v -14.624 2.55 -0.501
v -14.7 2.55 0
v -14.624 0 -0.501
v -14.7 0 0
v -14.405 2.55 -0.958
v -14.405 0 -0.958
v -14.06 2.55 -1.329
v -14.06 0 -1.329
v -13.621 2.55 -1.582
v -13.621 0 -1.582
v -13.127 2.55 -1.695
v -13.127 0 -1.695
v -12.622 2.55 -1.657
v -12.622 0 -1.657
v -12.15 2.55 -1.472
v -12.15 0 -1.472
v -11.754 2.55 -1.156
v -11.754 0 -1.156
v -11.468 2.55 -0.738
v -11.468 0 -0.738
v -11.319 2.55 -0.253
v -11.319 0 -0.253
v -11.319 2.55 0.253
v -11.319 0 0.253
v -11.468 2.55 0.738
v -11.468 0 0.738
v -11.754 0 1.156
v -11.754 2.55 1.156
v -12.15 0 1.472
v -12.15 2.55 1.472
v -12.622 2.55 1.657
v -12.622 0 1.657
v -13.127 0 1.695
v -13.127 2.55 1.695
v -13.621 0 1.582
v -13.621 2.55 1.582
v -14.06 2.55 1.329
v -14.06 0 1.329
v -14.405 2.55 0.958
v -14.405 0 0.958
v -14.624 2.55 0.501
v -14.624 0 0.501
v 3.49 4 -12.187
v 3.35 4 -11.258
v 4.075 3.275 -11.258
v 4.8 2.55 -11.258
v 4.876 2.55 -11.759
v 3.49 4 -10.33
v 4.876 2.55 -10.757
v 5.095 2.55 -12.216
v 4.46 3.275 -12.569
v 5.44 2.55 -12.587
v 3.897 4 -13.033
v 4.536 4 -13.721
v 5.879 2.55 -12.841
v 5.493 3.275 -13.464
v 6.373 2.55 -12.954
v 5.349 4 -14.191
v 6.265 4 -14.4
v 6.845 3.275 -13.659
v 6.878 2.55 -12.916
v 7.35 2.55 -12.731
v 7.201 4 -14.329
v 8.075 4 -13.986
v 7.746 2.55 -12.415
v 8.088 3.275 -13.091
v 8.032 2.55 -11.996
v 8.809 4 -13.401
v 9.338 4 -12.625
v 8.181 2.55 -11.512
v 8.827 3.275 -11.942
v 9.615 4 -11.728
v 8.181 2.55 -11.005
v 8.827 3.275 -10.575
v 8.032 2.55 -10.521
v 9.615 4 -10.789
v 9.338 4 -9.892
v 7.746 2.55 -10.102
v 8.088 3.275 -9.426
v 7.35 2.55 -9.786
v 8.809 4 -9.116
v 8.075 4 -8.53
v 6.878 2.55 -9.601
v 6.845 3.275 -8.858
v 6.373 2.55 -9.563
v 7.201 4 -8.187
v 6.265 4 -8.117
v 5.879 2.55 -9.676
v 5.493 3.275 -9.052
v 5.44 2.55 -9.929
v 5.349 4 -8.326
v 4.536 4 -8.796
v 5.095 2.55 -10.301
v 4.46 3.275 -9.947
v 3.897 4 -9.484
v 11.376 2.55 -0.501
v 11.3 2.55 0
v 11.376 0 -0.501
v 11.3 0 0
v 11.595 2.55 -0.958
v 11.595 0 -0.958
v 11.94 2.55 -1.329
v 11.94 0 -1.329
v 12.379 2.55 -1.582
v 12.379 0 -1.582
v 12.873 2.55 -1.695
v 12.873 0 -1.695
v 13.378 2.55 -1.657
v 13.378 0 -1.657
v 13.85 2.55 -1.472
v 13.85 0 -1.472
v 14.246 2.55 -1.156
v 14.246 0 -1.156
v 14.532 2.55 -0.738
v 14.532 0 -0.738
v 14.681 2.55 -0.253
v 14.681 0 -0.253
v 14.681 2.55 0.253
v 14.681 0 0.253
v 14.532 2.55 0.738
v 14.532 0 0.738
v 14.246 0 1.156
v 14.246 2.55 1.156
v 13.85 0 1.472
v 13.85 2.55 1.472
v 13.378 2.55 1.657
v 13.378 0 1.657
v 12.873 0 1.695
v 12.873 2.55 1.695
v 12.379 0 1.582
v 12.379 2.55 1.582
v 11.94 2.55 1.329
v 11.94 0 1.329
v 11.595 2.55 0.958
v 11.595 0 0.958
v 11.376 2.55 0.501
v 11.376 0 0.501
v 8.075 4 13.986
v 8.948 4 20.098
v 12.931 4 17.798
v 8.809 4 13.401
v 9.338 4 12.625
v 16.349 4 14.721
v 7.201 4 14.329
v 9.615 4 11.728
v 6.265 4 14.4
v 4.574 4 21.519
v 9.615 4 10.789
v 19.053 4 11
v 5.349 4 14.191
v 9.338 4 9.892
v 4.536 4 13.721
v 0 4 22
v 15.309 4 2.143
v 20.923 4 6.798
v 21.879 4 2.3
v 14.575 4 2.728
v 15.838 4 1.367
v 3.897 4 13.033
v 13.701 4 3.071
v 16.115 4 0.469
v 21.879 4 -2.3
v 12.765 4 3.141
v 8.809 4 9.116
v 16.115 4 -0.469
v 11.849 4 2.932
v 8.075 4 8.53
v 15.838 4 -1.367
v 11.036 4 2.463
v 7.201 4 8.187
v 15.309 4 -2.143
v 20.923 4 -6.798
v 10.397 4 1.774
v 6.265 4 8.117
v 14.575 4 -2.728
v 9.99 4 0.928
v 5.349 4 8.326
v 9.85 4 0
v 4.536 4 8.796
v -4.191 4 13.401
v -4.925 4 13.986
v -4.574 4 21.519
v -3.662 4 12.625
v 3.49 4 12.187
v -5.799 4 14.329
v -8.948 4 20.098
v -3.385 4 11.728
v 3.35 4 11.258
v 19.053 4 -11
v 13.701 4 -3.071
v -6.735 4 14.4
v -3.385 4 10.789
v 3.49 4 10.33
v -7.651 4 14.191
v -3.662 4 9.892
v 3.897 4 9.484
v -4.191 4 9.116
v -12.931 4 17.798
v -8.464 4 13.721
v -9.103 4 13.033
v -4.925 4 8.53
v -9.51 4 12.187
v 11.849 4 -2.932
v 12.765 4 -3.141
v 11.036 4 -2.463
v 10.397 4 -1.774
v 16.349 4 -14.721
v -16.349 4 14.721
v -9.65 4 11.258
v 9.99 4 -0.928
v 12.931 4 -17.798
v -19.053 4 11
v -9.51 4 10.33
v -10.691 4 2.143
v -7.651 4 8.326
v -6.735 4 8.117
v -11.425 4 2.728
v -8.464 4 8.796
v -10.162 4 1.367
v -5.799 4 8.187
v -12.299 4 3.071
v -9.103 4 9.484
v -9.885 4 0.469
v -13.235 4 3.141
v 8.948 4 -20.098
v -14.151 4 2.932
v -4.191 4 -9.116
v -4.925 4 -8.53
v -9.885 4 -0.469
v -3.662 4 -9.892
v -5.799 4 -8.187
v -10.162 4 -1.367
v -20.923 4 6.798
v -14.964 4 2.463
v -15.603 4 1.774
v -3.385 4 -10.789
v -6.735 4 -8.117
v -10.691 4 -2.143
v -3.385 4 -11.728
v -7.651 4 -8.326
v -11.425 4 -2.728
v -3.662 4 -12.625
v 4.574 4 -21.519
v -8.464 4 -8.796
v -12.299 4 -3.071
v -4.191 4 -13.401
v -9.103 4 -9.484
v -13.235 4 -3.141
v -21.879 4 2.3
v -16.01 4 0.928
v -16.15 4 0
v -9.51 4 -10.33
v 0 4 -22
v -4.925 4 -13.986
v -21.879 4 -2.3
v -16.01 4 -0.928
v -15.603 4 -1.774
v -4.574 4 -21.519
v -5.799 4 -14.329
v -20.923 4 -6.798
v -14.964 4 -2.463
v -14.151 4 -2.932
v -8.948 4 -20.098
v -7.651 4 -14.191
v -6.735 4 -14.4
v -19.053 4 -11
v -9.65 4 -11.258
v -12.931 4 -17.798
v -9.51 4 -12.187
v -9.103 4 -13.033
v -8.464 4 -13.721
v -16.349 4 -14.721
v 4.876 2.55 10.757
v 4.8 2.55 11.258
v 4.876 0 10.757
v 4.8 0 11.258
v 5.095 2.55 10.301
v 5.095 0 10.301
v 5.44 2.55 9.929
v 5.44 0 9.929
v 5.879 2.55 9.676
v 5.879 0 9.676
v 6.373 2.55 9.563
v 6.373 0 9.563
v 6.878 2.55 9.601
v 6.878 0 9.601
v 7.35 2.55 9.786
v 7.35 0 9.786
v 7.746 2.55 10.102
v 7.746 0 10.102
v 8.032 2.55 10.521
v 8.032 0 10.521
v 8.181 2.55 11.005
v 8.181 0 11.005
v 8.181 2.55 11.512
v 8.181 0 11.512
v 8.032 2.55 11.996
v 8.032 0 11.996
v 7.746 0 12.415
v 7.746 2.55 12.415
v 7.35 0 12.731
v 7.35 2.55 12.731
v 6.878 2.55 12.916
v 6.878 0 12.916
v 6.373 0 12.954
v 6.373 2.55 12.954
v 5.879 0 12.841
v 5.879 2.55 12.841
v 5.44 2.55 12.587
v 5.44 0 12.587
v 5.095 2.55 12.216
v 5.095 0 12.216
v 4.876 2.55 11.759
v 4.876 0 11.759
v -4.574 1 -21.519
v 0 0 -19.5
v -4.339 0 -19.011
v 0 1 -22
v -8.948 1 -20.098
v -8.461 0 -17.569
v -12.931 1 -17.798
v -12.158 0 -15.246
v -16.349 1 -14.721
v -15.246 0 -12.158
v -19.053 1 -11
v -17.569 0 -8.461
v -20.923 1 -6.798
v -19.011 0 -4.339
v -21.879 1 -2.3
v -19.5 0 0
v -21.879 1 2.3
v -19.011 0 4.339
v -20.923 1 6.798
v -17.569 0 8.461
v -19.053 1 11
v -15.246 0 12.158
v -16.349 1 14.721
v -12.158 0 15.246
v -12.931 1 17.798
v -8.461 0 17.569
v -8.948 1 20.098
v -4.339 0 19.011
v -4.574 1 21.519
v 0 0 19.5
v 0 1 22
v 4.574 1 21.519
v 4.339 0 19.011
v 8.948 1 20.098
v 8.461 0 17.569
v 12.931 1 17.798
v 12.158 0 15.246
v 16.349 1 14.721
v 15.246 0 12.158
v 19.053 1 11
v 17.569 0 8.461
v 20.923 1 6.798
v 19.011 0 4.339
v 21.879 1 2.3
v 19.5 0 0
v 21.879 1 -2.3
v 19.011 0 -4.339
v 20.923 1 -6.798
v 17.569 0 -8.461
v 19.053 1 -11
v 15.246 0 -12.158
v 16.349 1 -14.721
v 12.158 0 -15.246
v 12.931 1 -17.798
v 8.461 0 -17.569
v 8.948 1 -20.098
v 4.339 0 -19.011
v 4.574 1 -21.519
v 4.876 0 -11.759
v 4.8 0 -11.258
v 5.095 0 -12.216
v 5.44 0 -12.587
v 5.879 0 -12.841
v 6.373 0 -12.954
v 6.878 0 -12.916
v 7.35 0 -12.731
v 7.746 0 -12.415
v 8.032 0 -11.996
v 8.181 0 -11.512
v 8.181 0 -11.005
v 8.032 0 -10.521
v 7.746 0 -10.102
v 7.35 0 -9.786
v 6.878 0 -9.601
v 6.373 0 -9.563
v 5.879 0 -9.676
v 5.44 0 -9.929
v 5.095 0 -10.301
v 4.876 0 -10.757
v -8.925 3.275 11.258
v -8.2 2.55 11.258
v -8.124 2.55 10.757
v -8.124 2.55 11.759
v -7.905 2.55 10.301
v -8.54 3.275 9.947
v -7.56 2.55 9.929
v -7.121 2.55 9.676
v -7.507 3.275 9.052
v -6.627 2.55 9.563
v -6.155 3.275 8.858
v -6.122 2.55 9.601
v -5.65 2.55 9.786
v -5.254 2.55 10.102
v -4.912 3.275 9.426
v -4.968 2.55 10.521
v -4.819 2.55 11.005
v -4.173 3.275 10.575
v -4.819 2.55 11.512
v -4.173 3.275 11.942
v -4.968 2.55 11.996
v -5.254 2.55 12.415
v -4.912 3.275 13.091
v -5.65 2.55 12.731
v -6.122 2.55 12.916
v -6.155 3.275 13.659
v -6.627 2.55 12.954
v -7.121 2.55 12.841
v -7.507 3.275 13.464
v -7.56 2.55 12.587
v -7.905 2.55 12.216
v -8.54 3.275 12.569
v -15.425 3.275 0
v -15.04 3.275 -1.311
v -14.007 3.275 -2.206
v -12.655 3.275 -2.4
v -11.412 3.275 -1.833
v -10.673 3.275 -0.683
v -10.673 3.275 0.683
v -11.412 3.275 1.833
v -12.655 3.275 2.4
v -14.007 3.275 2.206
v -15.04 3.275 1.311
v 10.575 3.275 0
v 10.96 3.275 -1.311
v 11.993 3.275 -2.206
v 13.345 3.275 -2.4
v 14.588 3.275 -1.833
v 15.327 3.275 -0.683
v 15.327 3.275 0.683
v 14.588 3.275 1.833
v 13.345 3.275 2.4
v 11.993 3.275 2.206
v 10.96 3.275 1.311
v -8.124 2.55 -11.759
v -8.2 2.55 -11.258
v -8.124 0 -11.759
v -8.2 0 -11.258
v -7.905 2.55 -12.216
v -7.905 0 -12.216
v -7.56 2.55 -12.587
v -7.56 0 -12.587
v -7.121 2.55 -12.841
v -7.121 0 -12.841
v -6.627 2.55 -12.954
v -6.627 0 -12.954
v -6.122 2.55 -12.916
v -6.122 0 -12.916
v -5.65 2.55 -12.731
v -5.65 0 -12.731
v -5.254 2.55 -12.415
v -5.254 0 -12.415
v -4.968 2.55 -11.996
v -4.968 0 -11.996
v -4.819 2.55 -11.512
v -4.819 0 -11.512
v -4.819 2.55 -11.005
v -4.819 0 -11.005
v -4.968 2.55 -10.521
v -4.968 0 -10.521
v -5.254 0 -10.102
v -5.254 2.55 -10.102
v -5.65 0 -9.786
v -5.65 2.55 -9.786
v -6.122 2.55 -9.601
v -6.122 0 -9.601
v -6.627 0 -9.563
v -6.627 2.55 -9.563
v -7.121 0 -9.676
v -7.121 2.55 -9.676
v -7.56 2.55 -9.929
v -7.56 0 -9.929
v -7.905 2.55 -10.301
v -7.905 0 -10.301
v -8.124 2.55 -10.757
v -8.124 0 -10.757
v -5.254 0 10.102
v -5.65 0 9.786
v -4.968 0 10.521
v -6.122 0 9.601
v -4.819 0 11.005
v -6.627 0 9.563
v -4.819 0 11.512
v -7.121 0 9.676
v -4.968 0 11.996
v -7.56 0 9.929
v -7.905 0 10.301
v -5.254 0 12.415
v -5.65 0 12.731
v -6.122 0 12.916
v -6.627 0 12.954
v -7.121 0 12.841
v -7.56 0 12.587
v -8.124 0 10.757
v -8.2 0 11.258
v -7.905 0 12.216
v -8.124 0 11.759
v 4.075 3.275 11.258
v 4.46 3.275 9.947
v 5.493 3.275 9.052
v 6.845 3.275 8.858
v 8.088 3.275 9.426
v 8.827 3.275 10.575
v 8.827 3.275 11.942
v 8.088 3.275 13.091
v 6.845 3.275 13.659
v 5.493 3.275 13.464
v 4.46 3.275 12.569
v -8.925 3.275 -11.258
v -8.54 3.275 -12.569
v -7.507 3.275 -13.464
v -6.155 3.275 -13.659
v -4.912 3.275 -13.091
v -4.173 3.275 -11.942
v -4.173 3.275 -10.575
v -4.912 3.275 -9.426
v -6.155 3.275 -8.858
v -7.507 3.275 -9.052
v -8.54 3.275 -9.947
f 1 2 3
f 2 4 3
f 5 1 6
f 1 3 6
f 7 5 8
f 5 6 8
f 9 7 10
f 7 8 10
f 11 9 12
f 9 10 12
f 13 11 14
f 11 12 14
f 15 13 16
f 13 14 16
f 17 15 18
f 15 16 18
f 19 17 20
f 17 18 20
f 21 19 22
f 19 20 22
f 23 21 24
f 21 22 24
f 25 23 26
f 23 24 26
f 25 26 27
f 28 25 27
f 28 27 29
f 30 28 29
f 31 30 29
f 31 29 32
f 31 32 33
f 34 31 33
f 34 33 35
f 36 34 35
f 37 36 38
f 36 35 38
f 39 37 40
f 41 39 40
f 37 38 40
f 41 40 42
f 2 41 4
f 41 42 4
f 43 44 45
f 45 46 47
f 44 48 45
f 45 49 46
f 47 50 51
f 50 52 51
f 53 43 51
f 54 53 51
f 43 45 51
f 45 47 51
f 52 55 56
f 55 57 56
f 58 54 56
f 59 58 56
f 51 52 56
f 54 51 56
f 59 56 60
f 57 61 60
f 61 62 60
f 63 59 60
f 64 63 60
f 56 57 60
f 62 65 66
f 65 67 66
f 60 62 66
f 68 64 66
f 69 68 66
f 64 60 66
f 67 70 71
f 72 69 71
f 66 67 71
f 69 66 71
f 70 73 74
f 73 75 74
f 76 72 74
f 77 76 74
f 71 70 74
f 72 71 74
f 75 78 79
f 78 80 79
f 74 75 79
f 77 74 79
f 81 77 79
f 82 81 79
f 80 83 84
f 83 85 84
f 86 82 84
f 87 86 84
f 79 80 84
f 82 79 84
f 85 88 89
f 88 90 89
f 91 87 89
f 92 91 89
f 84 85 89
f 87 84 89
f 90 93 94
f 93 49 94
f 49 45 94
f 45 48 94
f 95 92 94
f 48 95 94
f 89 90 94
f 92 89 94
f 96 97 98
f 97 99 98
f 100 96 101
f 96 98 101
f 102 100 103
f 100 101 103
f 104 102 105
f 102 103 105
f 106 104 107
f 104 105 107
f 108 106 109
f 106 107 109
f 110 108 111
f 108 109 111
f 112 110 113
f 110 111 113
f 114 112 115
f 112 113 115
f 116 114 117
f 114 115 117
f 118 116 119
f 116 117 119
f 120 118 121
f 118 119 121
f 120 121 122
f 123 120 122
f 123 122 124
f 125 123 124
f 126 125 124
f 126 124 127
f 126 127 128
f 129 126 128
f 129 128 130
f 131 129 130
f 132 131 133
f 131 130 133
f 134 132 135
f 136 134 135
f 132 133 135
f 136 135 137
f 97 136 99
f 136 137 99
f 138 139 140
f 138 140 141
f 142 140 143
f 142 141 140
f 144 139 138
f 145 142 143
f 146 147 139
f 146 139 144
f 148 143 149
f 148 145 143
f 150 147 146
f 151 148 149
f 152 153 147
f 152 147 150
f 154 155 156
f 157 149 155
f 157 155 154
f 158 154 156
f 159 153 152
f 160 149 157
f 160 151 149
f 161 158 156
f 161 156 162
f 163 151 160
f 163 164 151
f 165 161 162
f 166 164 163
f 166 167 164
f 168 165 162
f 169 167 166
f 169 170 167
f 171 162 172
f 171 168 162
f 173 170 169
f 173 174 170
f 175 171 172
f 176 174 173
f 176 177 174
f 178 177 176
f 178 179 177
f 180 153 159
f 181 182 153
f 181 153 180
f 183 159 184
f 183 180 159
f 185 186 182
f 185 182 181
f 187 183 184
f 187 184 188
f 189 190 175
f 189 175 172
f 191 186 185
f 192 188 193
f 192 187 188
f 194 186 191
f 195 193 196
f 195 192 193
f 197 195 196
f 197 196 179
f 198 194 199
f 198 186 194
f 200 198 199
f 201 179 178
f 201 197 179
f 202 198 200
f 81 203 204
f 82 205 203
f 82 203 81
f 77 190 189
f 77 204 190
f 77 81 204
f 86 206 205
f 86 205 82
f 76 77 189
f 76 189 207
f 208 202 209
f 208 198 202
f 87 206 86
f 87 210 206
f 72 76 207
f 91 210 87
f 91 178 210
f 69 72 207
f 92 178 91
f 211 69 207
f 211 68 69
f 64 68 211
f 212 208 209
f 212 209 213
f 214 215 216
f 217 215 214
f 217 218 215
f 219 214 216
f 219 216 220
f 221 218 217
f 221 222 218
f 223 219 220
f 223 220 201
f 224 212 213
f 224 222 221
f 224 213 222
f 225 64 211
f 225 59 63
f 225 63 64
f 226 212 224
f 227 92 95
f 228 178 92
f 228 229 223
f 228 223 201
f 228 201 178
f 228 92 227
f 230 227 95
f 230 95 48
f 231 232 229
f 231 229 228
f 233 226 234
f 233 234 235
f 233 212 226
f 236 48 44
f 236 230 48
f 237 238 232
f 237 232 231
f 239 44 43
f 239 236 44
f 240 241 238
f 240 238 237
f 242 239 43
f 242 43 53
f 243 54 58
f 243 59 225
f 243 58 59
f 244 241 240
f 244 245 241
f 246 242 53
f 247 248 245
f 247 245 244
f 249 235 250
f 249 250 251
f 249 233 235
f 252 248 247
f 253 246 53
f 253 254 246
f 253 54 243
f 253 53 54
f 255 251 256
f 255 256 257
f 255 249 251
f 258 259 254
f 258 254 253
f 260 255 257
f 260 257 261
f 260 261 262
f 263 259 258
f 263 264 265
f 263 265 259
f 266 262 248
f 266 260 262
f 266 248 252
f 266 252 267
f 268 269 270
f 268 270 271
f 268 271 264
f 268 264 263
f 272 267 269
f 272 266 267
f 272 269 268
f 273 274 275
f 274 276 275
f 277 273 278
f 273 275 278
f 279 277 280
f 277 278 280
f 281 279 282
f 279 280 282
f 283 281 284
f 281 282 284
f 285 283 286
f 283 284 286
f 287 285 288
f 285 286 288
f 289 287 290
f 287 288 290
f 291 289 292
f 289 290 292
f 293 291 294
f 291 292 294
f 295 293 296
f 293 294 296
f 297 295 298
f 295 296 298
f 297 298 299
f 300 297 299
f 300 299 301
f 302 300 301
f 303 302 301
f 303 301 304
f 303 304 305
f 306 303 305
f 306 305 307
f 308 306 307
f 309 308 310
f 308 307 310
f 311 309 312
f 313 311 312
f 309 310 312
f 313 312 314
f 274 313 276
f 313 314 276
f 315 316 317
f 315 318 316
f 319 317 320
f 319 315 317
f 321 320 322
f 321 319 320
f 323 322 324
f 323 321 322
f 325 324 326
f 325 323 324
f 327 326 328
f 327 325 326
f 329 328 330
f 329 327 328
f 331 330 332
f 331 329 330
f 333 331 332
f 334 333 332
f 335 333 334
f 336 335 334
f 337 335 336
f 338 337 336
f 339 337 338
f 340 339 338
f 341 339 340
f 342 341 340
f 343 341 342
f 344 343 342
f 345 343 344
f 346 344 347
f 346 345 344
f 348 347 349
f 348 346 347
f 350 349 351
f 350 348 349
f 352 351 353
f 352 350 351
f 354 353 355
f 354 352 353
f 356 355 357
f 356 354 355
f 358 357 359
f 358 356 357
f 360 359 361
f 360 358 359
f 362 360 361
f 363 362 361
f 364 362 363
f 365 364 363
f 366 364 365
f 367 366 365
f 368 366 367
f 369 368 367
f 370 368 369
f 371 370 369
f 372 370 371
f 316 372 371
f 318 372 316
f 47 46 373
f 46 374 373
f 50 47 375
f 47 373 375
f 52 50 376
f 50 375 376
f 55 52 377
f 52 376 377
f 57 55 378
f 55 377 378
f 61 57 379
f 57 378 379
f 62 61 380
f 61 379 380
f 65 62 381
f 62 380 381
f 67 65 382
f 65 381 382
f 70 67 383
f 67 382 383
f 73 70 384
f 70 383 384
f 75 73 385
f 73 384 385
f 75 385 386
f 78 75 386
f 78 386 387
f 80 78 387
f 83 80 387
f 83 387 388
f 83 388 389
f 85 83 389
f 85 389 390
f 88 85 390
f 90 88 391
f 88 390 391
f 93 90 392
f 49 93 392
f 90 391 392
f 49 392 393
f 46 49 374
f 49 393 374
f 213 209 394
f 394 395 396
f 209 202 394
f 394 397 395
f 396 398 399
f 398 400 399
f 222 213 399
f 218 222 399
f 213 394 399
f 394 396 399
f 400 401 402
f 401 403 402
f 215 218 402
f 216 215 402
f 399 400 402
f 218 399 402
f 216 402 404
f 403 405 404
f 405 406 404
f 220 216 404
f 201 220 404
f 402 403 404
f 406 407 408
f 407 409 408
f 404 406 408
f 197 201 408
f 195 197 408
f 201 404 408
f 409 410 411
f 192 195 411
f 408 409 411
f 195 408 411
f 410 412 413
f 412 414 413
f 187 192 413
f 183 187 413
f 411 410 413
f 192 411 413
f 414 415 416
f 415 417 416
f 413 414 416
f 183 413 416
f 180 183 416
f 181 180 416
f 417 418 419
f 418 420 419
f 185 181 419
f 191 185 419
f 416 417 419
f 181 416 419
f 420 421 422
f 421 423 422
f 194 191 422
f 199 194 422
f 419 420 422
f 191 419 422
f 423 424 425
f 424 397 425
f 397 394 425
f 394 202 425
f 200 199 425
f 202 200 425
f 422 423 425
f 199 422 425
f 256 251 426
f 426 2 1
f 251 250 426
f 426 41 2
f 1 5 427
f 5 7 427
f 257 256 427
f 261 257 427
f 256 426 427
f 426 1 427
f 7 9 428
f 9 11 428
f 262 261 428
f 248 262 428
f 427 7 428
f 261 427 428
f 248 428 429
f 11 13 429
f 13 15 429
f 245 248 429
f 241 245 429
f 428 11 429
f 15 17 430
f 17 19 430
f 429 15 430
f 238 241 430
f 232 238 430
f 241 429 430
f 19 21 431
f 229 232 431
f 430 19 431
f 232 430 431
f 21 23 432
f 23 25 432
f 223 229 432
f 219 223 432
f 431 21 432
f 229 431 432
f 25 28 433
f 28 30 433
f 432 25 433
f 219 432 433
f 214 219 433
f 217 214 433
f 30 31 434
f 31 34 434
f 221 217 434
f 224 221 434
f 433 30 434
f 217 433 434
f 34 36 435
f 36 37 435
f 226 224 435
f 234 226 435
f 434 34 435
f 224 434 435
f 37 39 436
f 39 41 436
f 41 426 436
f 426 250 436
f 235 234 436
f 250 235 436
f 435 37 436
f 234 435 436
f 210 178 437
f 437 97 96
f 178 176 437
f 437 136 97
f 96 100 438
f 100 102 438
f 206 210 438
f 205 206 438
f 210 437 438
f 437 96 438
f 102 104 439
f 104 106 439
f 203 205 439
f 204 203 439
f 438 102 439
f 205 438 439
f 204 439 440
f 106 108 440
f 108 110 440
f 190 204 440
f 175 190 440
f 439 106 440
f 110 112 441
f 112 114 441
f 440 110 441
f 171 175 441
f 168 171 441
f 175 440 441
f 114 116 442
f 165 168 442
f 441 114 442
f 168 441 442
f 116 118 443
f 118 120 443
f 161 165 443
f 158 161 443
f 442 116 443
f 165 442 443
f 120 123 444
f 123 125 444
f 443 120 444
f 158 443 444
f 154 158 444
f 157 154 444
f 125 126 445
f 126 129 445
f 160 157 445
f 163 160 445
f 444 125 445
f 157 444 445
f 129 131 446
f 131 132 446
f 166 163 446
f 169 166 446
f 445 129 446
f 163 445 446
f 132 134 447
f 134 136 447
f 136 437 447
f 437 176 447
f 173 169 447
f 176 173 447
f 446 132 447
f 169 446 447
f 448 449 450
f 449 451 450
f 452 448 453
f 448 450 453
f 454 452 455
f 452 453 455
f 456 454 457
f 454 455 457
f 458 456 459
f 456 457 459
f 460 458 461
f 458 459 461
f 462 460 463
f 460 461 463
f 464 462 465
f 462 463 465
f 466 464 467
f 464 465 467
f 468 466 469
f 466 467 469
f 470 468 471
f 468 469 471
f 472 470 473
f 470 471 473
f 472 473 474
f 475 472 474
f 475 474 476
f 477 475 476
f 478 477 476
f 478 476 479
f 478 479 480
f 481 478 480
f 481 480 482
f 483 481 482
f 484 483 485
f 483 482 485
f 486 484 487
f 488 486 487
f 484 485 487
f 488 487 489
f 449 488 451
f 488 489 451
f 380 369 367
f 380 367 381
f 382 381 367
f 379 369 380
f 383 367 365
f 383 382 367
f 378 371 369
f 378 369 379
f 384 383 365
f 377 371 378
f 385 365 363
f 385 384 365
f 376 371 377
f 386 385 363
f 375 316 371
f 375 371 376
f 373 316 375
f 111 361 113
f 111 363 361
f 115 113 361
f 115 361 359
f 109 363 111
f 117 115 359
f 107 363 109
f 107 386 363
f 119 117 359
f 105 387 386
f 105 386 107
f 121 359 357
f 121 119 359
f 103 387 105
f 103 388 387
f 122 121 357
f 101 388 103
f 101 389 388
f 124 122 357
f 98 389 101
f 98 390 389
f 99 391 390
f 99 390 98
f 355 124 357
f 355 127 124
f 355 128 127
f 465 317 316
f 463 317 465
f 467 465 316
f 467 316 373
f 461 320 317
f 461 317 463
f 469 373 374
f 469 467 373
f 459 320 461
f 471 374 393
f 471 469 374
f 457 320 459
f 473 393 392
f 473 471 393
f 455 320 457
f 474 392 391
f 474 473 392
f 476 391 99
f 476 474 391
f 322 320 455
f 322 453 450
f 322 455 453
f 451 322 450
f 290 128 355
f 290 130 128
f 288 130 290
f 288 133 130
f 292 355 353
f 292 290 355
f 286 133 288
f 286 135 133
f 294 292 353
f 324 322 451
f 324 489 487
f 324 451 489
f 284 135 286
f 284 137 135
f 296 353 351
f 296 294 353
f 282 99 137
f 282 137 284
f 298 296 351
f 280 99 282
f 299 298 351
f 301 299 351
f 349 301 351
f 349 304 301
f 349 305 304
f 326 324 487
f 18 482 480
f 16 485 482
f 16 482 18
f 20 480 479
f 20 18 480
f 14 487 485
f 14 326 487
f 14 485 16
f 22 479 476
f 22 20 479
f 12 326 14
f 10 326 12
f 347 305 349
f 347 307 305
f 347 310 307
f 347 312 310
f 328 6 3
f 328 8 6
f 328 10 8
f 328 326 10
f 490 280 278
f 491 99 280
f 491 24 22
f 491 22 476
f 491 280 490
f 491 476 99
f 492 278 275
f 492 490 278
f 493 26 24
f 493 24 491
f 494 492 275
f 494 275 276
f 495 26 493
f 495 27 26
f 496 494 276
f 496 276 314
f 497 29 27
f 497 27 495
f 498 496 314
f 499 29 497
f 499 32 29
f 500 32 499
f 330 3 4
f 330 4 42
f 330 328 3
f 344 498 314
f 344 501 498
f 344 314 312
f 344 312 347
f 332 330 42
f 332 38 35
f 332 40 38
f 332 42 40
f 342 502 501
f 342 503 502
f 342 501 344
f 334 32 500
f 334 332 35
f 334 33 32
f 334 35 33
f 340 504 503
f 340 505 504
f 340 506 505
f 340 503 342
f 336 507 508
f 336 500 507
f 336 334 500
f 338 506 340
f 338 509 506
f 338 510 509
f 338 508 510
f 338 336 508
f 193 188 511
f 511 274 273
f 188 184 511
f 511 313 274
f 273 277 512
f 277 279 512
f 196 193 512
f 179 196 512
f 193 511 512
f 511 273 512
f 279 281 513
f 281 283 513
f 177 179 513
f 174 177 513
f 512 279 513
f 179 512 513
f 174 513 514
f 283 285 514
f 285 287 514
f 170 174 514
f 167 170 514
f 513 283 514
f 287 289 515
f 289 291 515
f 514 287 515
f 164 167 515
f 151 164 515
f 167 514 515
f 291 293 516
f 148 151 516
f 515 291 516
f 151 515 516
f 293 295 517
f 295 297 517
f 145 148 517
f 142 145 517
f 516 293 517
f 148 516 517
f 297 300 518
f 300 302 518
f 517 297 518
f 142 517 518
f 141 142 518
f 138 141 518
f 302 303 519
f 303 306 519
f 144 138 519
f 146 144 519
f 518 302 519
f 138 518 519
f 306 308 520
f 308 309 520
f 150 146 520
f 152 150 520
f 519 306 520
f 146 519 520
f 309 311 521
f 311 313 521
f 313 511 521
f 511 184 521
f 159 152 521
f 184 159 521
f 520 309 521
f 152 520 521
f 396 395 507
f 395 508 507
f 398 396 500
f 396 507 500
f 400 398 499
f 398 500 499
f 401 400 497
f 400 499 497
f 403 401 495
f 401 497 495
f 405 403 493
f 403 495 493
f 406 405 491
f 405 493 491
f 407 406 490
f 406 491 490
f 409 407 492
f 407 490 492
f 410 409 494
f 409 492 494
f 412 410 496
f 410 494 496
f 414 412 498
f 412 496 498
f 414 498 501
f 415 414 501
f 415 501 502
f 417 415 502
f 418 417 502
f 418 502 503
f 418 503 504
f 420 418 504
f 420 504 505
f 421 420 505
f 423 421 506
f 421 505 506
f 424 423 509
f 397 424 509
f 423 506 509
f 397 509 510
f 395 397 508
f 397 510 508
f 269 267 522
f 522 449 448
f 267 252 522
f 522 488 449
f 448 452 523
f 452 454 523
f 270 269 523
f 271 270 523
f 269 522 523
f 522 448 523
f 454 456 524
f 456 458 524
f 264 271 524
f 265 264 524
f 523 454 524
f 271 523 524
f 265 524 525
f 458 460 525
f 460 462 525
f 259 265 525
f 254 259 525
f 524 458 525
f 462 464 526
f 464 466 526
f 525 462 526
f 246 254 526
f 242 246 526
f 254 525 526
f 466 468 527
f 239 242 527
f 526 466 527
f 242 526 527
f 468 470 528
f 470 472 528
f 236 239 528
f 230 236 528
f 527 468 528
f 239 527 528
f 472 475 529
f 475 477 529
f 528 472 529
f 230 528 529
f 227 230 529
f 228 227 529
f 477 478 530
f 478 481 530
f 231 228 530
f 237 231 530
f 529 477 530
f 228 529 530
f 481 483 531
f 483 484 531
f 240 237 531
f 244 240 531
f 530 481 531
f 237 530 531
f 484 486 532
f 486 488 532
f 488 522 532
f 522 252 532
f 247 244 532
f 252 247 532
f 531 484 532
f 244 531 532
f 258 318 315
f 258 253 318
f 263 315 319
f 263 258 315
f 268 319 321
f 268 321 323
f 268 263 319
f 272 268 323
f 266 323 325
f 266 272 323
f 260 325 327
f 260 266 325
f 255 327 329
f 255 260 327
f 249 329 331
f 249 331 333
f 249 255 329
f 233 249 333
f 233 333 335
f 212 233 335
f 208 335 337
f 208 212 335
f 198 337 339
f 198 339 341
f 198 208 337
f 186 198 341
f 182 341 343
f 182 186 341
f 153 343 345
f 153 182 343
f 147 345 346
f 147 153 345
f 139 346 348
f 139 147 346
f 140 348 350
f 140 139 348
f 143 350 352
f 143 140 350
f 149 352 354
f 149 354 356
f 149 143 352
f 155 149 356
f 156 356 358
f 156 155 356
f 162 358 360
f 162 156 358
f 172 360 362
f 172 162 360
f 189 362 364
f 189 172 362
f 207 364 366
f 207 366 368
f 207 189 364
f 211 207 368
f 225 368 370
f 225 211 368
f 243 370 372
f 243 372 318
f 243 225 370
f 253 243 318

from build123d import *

# Parameters (mm, degrees)
HOLE_WIZARD_M31_D           = 3.4
HOLE_WIZARD_M31_CSINK_D     = 6.3
HOLE_WIZARD_M31_CSINK_ANGLE = 90


with BuildPart() as part:
    # Эскиз1 → Повернуть1 (revolve)
    with BuildSketch(Plane(origin=(0, 0, 0), x_dir=(0, 0, -1), z_dir=(1, 0, 0))):
        Polygon((22, 1), (22, 4), (0, 4), (0, 0), (19.5, 0), align=None)
    revolve(axis=Axis((0, 0, 0), (0, 1, 0)))

    # Зенковка для винта с полупотайной головкой M31 (through all)
    with Locations(Plane(origin=(0, 4, 0), x_dir=(1, 0, 0), z_dir=(0, 1, 0))):
        with Locations((6.5, 11.258330249), (13, 0), (6.5, -11.258330249), (-6.5, -11.258330249), (-13, 0), (-6.5, 11.258330249)):
            CounterSinkHole(HOLE_WIZARD_M31_D / 2, HOLE_WIZARD_M31_CSINK_D / 2, counter_sink_angle=HOLE_WIZARD_M31_CSINK_ANGLE)


solid = part.part
